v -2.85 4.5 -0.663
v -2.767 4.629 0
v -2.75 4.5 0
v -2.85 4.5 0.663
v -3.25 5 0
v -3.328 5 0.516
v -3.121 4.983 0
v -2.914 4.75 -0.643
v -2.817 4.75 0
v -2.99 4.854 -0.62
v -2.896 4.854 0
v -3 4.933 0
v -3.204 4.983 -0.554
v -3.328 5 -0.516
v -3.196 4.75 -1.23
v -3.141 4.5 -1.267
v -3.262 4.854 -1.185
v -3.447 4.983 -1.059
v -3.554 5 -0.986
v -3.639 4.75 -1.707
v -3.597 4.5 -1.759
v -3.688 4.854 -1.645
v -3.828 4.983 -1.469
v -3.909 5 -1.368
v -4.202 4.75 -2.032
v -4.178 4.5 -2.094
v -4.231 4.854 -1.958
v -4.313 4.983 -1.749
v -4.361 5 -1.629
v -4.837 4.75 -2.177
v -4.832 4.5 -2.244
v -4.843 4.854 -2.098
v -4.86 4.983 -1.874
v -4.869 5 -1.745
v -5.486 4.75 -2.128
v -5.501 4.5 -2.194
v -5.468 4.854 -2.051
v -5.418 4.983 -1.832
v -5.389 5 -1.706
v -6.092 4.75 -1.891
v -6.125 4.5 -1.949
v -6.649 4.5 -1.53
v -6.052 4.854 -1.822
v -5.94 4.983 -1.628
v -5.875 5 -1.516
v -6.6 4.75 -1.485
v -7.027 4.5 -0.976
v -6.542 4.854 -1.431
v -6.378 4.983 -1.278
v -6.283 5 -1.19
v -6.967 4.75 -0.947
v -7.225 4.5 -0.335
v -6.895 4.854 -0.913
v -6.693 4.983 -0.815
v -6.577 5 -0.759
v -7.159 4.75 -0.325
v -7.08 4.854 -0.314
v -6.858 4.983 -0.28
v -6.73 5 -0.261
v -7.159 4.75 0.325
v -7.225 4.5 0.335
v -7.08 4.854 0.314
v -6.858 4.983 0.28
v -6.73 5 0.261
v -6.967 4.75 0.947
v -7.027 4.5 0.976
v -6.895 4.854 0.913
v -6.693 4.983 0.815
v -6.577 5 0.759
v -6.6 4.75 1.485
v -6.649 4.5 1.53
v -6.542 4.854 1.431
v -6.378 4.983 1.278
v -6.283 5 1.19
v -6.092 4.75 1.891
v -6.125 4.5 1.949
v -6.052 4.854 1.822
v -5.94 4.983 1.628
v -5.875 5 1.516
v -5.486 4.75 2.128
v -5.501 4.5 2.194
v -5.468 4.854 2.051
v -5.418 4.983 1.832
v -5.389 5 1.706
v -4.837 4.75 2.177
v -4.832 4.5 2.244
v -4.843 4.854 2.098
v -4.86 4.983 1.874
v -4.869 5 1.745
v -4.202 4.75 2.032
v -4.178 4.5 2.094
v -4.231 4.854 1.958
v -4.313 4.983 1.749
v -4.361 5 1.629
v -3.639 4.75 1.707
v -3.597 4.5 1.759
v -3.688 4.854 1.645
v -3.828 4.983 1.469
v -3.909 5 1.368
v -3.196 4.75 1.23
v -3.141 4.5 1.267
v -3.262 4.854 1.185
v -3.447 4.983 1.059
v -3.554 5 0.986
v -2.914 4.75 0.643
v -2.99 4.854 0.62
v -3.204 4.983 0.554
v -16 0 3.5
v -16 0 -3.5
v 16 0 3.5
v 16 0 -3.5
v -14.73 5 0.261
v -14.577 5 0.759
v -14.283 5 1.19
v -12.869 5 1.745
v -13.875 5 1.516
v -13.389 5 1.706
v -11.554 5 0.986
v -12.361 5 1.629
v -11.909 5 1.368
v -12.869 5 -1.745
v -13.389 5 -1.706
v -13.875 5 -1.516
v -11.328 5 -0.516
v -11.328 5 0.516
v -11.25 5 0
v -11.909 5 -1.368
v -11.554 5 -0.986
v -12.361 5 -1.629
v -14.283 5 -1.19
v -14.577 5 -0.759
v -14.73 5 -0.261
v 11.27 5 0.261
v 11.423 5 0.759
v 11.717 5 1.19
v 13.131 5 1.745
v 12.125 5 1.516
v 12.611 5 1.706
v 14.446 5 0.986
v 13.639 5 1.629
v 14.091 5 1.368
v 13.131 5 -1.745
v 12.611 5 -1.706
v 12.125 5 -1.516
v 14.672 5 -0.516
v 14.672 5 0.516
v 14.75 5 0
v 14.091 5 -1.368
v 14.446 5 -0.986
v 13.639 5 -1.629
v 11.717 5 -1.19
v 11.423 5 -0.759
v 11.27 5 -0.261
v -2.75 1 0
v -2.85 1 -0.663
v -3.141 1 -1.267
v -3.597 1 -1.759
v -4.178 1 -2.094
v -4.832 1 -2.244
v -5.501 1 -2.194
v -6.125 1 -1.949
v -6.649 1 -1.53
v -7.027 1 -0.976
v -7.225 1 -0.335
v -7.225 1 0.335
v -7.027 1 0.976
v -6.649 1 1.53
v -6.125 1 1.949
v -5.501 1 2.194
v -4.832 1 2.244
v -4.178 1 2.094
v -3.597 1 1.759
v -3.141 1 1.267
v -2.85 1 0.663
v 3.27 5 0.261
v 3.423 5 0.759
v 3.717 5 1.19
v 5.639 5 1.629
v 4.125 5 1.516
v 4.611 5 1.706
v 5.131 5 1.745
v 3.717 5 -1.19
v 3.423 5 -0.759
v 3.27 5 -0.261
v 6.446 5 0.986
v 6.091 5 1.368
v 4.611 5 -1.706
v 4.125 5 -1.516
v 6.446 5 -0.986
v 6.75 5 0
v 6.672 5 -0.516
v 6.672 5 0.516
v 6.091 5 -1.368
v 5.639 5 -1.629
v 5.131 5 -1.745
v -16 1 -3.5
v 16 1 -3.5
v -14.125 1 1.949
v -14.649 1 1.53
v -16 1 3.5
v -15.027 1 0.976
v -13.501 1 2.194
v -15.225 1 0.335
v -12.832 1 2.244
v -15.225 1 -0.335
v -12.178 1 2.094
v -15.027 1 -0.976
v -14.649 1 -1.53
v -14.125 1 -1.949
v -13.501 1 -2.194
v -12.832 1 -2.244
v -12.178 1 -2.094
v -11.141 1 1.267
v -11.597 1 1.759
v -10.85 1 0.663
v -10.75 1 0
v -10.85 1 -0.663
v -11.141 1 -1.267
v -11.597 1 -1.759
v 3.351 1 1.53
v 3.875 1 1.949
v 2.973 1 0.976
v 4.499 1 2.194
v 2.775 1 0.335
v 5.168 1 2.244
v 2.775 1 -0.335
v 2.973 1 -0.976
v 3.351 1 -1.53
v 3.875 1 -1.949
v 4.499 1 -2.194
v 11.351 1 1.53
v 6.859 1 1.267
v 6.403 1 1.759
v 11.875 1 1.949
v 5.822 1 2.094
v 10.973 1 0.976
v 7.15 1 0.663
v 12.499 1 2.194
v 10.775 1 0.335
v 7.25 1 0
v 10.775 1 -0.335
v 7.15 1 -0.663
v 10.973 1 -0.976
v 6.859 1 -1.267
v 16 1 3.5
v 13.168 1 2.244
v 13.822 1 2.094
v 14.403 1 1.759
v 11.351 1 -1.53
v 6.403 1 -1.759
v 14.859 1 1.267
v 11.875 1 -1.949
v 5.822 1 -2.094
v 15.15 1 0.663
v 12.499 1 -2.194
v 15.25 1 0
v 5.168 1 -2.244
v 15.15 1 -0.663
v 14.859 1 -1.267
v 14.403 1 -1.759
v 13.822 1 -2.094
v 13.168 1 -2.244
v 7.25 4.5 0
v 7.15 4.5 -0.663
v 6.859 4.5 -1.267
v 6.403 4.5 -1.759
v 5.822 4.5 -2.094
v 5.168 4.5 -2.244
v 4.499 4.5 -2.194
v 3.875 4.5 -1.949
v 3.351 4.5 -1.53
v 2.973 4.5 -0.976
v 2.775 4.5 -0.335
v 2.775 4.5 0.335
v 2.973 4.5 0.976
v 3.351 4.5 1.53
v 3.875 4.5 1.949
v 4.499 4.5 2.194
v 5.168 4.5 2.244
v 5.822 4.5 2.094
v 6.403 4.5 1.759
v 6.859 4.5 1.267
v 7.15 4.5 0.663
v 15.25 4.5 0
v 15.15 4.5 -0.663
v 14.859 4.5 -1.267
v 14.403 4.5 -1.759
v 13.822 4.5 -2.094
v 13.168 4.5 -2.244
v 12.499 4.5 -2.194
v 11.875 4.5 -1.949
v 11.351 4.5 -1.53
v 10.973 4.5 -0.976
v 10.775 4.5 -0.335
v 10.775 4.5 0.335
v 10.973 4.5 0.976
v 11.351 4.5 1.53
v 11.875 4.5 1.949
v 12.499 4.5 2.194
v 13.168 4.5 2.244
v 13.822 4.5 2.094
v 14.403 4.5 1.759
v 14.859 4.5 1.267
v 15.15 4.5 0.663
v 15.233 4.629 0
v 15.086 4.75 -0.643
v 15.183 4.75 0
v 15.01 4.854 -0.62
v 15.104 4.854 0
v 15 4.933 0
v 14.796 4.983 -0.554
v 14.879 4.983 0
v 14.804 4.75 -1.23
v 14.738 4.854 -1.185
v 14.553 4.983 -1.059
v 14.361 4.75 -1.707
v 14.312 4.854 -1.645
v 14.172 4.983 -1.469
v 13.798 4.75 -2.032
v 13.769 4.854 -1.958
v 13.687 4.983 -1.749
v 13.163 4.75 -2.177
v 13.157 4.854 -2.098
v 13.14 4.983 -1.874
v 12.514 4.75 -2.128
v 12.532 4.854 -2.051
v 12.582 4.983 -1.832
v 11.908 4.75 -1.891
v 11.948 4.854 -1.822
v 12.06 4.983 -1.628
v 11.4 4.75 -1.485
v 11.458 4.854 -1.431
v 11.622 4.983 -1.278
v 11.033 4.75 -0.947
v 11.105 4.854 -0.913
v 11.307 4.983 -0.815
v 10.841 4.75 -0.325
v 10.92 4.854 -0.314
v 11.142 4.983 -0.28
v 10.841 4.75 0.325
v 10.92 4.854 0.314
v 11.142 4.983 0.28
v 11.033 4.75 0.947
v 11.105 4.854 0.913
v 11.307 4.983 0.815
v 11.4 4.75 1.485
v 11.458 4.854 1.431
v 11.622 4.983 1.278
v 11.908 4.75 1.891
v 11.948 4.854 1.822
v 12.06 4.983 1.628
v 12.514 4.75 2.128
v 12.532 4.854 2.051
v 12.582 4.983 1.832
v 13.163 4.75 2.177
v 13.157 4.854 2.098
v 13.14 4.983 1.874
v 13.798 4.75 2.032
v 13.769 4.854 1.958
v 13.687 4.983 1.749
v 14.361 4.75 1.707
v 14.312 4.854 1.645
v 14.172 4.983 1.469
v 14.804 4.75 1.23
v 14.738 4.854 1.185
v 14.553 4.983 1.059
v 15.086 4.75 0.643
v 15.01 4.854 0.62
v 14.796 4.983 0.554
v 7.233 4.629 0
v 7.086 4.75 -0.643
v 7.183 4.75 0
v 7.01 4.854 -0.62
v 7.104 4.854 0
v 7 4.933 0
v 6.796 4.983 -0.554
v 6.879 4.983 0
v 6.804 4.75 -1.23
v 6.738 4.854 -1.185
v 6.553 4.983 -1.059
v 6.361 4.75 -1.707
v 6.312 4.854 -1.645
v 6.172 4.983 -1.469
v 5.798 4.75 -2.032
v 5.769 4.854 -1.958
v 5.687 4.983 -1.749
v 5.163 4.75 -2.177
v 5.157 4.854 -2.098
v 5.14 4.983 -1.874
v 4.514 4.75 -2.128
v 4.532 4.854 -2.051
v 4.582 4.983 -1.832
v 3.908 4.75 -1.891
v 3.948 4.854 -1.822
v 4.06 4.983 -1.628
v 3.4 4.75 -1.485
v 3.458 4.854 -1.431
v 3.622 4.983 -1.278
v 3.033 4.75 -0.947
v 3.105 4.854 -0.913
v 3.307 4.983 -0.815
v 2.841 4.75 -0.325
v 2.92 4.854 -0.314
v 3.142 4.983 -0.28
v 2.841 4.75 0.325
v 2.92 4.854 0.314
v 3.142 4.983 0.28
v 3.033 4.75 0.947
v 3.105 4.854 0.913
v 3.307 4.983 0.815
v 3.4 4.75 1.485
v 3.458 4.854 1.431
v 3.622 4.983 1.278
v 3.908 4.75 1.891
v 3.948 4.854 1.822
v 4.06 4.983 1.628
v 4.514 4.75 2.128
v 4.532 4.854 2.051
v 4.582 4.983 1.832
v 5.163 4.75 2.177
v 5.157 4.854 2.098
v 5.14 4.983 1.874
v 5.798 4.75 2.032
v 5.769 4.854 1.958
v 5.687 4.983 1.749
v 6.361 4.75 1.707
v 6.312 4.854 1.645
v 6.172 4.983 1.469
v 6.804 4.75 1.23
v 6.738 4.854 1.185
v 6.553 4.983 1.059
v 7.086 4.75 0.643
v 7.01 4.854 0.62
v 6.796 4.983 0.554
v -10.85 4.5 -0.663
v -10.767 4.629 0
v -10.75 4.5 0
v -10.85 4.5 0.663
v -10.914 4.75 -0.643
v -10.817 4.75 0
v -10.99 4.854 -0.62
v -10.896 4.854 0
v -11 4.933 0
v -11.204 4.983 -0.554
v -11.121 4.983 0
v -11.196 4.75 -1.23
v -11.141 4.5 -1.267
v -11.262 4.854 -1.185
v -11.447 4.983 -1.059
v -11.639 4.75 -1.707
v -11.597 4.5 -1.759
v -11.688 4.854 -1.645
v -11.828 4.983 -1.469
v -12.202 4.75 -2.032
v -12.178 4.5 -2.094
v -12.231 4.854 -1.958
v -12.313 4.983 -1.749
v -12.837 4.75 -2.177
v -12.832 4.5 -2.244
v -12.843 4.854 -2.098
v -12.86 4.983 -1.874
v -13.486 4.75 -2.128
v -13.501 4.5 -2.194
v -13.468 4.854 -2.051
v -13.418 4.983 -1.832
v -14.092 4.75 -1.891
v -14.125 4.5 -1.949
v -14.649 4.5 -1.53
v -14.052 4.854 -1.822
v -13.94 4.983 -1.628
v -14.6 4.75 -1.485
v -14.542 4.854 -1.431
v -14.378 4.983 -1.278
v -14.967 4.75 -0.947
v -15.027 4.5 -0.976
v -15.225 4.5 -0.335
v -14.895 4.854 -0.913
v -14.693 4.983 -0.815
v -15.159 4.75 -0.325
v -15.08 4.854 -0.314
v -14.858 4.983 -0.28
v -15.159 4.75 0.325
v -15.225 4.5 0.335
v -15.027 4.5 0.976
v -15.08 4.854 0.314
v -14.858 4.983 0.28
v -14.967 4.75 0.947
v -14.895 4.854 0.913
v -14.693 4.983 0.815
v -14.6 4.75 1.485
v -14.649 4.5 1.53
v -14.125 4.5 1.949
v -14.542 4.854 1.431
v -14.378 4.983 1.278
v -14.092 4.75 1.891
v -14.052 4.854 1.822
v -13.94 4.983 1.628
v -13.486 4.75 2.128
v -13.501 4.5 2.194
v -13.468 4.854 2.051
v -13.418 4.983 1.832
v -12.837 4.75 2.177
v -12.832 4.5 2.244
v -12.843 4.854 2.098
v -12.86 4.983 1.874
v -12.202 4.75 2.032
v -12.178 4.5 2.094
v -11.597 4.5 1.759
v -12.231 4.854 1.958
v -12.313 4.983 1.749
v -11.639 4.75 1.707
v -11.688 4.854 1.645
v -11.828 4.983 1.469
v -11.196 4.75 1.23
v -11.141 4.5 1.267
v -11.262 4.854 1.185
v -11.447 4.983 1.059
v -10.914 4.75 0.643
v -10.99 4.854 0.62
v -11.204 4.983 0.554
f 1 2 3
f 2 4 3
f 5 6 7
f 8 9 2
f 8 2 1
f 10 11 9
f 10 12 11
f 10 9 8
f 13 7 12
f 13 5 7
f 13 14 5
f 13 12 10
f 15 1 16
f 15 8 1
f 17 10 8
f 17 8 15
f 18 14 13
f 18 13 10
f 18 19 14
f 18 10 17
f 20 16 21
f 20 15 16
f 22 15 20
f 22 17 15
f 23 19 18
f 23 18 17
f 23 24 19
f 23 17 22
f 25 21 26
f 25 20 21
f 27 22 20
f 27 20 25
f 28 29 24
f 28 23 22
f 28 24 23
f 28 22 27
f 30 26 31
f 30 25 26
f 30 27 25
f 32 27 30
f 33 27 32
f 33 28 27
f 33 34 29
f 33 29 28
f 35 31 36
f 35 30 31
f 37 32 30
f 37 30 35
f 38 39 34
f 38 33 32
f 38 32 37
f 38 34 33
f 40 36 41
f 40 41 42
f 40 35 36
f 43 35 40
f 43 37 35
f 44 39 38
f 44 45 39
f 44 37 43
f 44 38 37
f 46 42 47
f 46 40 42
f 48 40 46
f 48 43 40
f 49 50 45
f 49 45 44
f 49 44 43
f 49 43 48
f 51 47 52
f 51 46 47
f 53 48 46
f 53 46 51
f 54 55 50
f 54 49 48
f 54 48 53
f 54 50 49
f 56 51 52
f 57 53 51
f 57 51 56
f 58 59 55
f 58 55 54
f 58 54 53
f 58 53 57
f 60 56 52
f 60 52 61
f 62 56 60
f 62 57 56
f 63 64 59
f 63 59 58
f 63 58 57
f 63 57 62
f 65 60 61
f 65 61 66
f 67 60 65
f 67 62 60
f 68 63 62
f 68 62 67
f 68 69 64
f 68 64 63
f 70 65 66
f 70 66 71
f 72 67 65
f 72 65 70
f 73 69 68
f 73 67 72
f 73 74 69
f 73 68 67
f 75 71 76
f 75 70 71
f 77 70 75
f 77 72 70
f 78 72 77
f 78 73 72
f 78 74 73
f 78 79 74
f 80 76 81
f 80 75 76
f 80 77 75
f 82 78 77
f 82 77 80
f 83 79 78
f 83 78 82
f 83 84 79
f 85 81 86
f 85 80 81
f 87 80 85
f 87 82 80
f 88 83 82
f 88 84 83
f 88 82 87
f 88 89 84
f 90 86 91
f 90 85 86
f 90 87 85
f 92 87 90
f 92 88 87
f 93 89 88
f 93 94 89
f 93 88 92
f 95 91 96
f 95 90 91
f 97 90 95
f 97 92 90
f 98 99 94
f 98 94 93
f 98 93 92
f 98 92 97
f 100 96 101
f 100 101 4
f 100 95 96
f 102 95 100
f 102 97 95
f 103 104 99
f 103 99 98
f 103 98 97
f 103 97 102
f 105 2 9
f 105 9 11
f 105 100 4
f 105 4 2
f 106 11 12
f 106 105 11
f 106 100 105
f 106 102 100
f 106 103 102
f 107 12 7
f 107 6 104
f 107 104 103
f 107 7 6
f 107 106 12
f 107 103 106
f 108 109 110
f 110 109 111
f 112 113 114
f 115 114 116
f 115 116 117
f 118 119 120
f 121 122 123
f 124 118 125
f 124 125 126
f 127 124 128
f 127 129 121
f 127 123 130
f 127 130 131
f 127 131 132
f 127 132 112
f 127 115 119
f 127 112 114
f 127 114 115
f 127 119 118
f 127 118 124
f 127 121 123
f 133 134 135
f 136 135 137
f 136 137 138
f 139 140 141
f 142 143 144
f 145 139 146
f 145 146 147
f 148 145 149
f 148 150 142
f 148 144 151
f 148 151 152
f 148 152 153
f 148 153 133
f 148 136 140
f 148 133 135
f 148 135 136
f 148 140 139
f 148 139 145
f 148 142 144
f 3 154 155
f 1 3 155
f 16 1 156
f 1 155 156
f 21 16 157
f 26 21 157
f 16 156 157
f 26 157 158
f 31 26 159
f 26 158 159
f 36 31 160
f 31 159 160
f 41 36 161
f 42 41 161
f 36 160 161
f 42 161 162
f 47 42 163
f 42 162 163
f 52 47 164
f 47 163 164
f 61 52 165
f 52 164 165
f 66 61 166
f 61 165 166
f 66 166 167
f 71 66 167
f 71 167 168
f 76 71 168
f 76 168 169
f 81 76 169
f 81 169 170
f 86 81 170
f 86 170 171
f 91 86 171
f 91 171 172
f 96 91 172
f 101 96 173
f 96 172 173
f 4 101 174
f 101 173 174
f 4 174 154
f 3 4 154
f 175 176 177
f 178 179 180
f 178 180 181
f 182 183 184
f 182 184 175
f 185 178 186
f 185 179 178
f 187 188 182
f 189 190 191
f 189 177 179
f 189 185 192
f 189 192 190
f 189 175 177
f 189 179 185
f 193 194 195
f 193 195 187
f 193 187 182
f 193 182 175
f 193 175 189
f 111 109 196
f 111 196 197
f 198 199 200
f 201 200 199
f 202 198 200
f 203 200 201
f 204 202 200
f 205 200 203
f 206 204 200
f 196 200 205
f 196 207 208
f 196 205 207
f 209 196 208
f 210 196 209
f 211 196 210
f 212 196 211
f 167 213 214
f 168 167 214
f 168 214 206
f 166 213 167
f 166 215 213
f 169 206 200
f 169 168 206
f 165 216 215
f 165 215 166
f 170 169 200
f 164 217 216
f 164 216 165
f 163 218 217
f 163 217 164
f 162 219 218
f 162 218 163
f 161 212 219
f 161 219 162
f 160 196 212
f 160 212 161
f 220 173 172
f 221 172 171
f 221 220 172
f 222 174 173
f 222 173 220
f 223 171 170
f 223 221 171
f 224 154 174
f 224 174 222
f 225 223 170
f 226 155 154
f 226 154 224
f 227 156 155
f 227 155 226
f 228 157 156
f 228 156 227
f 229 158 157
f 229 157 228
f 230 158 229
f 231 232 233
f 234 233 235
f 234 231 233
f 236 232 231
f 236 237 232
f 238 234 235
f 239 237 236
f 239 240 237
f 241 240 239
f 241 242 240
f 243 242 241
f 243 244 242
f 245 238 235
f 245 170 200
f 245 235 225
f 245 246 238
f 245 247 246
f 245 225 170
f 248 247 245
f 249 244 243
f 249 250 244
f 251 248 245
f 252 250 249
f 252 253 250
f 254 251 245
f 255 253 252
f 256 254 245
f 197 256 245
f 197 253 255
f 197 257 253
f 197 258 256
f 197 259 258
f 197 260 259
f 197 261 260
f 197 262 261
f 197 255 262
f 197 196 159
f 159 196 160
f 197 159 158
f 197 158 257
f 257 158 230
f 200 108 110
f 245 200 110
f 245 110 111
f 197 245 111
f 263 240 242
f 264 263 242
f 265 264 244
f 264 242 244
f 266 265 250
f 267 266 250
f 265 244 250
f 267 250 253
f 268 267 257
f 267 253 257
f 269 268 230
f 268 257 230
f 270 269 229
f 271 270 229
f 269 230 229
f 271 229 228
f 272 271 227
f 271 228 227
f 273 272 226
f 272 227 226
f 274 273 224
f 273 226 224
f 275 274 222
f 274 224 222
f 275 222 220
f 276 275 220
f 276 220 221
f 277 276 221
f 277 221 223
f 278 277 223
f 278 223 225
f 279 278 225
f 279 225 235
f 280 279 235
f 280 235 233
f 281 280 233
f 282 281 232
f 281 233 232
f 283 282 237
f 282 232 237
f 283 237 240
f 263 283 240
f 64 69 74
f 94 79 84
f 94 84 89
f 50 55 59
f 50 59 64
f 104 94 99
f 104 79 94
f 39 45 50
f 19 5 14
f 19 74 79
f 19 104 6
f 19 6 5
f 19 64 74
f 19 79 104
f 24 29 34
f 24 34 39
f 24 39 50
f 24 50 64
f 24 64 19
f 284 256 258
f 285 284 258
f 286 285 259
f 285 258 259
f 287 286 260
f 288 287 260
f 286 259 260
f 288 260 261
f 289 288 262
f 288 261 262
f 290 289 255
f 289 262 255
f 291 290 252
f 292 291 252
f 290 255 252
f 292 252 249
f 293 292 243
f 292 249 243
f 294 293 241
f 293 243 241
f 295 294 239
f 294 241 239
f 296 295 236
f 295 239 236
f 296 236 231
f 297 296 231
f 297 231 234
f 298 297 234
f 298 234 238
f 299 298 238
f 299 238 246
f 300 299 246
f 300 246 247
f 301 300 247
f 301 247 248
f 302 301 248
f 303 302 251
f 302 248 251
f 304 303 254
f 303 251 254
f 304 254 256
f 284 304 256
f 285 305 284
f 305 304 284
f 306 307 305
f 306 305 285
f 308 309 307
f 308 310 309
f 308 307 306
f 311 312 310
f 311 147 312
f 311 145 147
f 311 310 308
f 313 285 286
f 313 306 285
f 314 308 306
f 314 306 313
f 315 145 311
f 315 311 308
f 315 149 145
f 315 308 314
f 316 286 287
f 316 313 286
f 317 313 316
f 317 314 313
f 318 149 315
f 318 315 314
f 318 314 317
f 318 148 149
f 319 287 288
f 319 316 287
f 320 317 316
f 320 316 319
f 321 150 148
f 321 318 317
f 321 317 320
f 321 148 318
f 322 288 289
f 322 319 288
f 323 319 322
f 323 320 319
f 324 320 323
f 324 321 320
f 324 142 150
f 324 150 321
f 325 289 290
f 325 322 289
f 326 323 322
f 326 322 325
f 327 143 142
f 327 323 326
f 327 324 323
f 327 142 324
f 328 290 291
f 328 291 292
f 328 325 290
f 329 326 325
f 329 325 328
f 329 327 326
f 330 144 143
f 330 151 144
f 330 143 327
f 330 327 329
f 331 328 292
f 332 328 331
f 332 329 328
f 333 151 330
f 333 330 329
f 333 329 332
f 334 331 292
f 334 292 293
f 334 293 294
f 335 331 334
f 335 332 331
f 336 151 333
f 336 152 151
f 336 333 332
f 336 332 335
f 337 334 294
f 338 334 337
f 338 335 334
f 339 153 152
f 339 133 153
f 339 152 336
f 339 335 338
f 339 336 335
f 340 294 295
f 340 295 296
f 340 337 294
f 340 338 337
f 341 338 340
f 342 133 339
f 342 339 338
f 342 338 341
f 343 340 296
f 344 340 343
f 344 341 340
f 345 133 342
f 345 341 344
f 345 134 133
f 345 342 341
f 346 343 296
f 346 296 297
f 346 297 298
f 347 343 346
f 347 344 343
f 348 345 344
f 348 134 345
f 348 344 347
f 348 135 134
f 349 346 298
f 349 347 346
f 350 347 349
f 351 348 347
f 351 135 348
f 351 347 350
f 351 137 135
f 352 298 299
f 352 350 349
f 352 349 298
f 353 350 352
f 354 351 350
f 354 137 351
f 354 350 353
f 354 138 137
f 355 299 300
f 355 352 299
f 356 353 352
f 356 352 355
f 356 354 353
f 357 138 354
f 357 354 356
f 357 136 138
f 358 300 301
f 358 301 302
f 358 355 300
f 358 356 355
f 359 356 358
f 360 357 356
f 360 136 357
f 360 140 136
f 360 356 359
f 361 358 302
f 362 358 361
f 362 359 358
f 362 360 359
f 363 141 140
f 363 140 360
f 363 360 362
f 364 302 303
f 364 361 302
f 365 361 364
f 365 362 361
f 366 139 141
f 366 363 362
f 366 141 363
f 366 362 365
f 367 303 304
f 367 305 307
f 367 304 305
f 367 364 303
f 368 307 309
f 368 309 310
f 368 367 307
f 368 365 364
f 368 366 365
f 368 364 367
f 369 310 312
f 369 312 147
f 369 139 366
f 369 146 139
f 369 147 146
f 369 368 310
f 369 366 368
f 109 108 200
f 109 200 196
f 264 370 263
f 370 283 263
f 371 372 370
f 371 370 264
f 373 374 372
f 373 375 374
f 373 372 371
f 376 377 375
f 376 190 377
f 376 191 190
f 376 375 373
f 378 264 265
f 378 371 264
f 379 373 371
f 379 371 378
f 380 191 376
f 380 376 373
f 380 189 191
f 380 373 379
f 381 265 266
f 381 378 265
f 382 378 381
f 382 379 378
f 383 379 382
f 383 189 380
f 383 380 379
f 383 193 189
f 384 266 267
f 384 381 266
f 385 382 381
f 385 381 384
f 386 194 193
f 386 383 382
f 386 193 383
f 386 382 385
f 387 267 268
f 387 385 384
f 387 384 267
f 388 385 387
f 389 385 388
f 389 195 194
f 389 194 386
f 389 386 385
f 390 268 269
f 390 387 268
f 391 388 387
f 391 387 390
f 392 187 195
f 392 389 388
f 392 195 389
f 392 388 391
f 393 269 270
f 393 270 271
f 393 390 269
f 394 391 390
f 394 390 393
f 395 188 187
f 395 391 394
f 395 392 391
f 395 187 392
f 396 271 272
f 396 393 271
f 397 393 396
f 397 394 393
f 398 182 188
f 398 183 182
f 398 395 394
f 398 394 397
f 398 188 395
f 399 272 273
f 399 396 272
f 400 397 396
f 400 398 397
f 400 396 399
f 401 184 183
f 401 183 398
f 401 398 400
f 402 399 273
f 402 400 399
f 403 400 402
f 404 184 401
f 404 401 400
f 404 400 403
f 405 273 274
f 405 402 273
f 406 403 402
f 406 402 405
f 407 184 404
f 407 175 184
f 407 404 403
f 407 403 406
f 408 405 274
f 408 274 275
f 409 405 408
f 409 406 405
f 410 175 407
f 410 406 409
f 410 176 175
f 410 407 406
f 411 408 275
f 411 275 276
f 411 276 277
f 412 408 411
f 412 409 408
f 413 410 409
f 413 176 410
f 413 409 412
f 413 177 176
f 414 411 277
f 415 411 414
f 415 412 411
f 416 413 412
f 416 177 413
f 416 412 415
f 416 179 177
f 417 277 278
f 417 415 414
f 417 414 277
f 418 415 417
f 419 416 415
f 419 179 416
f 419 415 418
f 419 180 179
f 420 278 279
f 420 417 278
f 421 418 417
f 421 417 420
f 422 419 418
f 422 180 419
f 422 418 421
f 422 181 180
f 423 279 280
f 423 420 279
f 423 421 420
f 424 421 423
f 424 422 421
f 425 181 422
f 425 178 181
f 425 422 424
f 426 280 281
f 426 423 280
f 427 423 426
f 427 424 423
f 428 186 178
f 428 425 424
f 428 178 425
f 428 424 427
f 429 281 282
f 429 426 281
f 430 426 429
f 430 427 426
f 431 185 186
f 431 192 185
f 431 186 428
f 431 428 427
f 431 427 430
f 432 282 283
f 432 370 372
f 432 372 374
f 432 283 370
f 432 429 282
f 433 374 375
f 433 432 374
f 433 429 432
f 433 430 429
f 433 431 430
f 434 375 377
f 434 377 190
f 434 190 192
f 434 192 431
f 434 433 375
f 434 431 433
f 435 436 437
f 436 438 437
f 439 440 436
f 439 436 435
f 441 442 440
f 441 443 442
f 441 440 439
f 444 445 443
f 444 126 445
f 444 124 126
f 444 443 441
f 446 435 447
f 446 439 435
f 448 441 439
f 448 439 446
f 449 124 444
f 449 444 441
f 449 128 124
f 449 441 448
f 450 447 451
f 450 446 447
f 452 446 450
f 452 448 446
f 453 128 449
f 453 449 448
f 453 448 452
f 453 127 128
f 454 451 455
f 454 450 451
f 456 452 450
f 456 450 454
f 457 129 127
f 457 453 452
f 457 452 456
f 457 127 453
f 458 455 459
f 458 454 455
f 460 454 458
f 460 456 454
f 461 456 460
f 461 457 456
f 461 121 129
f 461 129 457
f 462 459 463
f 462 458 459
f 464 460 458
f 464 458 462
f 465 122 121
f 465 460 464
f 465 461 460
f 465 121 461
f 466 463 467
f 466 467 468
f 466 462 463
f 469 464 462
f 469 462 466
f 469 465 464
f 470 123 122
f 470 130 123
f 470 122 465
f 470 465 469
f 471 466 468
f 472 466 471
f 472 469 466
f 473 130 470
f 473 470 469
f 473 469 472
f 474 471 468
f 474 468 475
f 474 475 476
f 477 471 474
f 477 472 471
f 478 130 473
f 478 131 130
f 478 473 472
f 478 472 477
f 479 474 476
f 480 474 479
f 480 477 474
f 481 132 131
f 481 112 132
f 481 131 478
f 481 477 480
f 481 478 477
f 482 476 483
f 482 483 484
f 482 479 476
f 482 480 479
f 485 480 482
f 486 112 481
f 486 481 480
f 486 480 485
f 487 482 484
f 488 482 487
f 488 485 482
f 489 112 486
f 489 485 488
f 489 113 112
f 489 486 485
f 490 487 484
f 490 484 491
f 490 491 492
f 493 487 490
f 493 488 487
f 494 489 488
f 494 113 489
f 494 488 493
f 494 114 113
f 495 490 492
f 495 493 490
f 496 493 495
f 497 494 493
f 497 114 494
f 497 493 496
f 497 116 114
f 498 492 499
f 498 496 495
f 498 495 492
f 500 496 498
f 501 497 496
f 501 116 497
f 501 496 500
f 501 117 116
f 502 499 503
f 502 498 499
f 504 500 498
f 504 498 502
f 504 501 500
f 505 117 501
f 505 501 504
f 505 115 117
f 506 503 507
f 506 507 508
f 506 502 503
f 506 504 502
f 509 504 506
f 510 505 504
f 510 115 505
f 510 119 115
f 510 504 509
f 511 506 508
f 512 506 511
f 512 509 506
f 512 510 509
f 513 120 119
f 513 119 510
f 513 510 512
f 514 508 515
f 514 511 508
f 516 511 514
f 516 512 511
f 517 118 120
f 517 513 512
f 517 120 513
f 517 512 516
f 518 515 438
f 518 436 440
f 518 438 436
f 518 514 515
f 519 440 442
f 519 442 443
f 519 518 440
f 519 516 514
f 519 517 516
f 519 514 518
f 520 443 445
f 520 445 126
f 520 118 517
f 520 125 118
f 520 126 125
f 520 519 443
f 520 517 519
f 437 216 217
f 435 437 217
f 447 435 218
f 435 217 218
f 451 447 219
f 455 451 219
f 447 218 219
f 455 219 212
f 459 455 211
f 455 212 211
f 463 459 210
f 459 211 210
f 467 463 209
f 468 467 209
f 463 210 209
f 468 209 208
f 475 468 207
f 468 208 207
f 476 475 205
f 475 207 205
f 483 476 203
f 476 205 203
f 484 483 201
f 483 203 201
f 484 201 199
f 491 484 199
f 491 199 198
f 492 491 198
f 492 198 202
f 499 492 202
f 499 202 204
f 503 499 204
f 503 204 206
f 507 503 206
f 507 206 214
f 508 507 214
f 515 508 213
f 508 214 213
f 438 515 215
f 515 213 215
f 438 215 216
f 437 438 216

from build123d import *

# Parameters (mm, degrees)
SKETCH1_W           = 32
SKETCH1_H           = 7
BOSS_EXTRUDE1_DEPTH = 1
SKETCH2_R           = 2.25
BOSS_EXTRUDE2_DEPTH = 4
FILLET1_R           = 0.5


with BuildPart() as part:
    # Sketch1 → Boss-Extrude1 (new body)
    with BuildSketch(Plane(origin=(0, 0, 0), x_dir=(1, 0, 0), z_dir=(0, 1, 0))):
        Rectangle(SKETCH1_W, SKETCH1_H)
    extrude(amount=BOSS_EXTRUDE1_DEPTH)

    # Sketch2 → Boss-Extrude2 (add)
    with BuildSketch(Plane(origin=(0, 1, 0), x_dir=(1, 0, 0), z_dir=(0, 1, 0))):
        with Locations((-13, 0)):
            Circle(SKETCH2_R)
        with Locations((-5, 0)):
            Circle(SKETCH2_R)
        with Locations((5, 0)):
            Circle(SKETCH2_R)
        with Locations((13, 0)):
            Circle(SKETCH2_R)
    extrude(amount=BOSS_EXTRUDE2_DEPTH)

    # Fillet1
    fillet1_edges = [part.edges().sort_by_distance(p)[0] for p in [
        (-15.25, 5, 0),
        (-7.25, 5, 0),
        (2.75, 5, 0),
        (10.75, 5, 0),
    ]]
    fillet(fillet1_edges, radius=FILLET1_R)


solid = part.part
